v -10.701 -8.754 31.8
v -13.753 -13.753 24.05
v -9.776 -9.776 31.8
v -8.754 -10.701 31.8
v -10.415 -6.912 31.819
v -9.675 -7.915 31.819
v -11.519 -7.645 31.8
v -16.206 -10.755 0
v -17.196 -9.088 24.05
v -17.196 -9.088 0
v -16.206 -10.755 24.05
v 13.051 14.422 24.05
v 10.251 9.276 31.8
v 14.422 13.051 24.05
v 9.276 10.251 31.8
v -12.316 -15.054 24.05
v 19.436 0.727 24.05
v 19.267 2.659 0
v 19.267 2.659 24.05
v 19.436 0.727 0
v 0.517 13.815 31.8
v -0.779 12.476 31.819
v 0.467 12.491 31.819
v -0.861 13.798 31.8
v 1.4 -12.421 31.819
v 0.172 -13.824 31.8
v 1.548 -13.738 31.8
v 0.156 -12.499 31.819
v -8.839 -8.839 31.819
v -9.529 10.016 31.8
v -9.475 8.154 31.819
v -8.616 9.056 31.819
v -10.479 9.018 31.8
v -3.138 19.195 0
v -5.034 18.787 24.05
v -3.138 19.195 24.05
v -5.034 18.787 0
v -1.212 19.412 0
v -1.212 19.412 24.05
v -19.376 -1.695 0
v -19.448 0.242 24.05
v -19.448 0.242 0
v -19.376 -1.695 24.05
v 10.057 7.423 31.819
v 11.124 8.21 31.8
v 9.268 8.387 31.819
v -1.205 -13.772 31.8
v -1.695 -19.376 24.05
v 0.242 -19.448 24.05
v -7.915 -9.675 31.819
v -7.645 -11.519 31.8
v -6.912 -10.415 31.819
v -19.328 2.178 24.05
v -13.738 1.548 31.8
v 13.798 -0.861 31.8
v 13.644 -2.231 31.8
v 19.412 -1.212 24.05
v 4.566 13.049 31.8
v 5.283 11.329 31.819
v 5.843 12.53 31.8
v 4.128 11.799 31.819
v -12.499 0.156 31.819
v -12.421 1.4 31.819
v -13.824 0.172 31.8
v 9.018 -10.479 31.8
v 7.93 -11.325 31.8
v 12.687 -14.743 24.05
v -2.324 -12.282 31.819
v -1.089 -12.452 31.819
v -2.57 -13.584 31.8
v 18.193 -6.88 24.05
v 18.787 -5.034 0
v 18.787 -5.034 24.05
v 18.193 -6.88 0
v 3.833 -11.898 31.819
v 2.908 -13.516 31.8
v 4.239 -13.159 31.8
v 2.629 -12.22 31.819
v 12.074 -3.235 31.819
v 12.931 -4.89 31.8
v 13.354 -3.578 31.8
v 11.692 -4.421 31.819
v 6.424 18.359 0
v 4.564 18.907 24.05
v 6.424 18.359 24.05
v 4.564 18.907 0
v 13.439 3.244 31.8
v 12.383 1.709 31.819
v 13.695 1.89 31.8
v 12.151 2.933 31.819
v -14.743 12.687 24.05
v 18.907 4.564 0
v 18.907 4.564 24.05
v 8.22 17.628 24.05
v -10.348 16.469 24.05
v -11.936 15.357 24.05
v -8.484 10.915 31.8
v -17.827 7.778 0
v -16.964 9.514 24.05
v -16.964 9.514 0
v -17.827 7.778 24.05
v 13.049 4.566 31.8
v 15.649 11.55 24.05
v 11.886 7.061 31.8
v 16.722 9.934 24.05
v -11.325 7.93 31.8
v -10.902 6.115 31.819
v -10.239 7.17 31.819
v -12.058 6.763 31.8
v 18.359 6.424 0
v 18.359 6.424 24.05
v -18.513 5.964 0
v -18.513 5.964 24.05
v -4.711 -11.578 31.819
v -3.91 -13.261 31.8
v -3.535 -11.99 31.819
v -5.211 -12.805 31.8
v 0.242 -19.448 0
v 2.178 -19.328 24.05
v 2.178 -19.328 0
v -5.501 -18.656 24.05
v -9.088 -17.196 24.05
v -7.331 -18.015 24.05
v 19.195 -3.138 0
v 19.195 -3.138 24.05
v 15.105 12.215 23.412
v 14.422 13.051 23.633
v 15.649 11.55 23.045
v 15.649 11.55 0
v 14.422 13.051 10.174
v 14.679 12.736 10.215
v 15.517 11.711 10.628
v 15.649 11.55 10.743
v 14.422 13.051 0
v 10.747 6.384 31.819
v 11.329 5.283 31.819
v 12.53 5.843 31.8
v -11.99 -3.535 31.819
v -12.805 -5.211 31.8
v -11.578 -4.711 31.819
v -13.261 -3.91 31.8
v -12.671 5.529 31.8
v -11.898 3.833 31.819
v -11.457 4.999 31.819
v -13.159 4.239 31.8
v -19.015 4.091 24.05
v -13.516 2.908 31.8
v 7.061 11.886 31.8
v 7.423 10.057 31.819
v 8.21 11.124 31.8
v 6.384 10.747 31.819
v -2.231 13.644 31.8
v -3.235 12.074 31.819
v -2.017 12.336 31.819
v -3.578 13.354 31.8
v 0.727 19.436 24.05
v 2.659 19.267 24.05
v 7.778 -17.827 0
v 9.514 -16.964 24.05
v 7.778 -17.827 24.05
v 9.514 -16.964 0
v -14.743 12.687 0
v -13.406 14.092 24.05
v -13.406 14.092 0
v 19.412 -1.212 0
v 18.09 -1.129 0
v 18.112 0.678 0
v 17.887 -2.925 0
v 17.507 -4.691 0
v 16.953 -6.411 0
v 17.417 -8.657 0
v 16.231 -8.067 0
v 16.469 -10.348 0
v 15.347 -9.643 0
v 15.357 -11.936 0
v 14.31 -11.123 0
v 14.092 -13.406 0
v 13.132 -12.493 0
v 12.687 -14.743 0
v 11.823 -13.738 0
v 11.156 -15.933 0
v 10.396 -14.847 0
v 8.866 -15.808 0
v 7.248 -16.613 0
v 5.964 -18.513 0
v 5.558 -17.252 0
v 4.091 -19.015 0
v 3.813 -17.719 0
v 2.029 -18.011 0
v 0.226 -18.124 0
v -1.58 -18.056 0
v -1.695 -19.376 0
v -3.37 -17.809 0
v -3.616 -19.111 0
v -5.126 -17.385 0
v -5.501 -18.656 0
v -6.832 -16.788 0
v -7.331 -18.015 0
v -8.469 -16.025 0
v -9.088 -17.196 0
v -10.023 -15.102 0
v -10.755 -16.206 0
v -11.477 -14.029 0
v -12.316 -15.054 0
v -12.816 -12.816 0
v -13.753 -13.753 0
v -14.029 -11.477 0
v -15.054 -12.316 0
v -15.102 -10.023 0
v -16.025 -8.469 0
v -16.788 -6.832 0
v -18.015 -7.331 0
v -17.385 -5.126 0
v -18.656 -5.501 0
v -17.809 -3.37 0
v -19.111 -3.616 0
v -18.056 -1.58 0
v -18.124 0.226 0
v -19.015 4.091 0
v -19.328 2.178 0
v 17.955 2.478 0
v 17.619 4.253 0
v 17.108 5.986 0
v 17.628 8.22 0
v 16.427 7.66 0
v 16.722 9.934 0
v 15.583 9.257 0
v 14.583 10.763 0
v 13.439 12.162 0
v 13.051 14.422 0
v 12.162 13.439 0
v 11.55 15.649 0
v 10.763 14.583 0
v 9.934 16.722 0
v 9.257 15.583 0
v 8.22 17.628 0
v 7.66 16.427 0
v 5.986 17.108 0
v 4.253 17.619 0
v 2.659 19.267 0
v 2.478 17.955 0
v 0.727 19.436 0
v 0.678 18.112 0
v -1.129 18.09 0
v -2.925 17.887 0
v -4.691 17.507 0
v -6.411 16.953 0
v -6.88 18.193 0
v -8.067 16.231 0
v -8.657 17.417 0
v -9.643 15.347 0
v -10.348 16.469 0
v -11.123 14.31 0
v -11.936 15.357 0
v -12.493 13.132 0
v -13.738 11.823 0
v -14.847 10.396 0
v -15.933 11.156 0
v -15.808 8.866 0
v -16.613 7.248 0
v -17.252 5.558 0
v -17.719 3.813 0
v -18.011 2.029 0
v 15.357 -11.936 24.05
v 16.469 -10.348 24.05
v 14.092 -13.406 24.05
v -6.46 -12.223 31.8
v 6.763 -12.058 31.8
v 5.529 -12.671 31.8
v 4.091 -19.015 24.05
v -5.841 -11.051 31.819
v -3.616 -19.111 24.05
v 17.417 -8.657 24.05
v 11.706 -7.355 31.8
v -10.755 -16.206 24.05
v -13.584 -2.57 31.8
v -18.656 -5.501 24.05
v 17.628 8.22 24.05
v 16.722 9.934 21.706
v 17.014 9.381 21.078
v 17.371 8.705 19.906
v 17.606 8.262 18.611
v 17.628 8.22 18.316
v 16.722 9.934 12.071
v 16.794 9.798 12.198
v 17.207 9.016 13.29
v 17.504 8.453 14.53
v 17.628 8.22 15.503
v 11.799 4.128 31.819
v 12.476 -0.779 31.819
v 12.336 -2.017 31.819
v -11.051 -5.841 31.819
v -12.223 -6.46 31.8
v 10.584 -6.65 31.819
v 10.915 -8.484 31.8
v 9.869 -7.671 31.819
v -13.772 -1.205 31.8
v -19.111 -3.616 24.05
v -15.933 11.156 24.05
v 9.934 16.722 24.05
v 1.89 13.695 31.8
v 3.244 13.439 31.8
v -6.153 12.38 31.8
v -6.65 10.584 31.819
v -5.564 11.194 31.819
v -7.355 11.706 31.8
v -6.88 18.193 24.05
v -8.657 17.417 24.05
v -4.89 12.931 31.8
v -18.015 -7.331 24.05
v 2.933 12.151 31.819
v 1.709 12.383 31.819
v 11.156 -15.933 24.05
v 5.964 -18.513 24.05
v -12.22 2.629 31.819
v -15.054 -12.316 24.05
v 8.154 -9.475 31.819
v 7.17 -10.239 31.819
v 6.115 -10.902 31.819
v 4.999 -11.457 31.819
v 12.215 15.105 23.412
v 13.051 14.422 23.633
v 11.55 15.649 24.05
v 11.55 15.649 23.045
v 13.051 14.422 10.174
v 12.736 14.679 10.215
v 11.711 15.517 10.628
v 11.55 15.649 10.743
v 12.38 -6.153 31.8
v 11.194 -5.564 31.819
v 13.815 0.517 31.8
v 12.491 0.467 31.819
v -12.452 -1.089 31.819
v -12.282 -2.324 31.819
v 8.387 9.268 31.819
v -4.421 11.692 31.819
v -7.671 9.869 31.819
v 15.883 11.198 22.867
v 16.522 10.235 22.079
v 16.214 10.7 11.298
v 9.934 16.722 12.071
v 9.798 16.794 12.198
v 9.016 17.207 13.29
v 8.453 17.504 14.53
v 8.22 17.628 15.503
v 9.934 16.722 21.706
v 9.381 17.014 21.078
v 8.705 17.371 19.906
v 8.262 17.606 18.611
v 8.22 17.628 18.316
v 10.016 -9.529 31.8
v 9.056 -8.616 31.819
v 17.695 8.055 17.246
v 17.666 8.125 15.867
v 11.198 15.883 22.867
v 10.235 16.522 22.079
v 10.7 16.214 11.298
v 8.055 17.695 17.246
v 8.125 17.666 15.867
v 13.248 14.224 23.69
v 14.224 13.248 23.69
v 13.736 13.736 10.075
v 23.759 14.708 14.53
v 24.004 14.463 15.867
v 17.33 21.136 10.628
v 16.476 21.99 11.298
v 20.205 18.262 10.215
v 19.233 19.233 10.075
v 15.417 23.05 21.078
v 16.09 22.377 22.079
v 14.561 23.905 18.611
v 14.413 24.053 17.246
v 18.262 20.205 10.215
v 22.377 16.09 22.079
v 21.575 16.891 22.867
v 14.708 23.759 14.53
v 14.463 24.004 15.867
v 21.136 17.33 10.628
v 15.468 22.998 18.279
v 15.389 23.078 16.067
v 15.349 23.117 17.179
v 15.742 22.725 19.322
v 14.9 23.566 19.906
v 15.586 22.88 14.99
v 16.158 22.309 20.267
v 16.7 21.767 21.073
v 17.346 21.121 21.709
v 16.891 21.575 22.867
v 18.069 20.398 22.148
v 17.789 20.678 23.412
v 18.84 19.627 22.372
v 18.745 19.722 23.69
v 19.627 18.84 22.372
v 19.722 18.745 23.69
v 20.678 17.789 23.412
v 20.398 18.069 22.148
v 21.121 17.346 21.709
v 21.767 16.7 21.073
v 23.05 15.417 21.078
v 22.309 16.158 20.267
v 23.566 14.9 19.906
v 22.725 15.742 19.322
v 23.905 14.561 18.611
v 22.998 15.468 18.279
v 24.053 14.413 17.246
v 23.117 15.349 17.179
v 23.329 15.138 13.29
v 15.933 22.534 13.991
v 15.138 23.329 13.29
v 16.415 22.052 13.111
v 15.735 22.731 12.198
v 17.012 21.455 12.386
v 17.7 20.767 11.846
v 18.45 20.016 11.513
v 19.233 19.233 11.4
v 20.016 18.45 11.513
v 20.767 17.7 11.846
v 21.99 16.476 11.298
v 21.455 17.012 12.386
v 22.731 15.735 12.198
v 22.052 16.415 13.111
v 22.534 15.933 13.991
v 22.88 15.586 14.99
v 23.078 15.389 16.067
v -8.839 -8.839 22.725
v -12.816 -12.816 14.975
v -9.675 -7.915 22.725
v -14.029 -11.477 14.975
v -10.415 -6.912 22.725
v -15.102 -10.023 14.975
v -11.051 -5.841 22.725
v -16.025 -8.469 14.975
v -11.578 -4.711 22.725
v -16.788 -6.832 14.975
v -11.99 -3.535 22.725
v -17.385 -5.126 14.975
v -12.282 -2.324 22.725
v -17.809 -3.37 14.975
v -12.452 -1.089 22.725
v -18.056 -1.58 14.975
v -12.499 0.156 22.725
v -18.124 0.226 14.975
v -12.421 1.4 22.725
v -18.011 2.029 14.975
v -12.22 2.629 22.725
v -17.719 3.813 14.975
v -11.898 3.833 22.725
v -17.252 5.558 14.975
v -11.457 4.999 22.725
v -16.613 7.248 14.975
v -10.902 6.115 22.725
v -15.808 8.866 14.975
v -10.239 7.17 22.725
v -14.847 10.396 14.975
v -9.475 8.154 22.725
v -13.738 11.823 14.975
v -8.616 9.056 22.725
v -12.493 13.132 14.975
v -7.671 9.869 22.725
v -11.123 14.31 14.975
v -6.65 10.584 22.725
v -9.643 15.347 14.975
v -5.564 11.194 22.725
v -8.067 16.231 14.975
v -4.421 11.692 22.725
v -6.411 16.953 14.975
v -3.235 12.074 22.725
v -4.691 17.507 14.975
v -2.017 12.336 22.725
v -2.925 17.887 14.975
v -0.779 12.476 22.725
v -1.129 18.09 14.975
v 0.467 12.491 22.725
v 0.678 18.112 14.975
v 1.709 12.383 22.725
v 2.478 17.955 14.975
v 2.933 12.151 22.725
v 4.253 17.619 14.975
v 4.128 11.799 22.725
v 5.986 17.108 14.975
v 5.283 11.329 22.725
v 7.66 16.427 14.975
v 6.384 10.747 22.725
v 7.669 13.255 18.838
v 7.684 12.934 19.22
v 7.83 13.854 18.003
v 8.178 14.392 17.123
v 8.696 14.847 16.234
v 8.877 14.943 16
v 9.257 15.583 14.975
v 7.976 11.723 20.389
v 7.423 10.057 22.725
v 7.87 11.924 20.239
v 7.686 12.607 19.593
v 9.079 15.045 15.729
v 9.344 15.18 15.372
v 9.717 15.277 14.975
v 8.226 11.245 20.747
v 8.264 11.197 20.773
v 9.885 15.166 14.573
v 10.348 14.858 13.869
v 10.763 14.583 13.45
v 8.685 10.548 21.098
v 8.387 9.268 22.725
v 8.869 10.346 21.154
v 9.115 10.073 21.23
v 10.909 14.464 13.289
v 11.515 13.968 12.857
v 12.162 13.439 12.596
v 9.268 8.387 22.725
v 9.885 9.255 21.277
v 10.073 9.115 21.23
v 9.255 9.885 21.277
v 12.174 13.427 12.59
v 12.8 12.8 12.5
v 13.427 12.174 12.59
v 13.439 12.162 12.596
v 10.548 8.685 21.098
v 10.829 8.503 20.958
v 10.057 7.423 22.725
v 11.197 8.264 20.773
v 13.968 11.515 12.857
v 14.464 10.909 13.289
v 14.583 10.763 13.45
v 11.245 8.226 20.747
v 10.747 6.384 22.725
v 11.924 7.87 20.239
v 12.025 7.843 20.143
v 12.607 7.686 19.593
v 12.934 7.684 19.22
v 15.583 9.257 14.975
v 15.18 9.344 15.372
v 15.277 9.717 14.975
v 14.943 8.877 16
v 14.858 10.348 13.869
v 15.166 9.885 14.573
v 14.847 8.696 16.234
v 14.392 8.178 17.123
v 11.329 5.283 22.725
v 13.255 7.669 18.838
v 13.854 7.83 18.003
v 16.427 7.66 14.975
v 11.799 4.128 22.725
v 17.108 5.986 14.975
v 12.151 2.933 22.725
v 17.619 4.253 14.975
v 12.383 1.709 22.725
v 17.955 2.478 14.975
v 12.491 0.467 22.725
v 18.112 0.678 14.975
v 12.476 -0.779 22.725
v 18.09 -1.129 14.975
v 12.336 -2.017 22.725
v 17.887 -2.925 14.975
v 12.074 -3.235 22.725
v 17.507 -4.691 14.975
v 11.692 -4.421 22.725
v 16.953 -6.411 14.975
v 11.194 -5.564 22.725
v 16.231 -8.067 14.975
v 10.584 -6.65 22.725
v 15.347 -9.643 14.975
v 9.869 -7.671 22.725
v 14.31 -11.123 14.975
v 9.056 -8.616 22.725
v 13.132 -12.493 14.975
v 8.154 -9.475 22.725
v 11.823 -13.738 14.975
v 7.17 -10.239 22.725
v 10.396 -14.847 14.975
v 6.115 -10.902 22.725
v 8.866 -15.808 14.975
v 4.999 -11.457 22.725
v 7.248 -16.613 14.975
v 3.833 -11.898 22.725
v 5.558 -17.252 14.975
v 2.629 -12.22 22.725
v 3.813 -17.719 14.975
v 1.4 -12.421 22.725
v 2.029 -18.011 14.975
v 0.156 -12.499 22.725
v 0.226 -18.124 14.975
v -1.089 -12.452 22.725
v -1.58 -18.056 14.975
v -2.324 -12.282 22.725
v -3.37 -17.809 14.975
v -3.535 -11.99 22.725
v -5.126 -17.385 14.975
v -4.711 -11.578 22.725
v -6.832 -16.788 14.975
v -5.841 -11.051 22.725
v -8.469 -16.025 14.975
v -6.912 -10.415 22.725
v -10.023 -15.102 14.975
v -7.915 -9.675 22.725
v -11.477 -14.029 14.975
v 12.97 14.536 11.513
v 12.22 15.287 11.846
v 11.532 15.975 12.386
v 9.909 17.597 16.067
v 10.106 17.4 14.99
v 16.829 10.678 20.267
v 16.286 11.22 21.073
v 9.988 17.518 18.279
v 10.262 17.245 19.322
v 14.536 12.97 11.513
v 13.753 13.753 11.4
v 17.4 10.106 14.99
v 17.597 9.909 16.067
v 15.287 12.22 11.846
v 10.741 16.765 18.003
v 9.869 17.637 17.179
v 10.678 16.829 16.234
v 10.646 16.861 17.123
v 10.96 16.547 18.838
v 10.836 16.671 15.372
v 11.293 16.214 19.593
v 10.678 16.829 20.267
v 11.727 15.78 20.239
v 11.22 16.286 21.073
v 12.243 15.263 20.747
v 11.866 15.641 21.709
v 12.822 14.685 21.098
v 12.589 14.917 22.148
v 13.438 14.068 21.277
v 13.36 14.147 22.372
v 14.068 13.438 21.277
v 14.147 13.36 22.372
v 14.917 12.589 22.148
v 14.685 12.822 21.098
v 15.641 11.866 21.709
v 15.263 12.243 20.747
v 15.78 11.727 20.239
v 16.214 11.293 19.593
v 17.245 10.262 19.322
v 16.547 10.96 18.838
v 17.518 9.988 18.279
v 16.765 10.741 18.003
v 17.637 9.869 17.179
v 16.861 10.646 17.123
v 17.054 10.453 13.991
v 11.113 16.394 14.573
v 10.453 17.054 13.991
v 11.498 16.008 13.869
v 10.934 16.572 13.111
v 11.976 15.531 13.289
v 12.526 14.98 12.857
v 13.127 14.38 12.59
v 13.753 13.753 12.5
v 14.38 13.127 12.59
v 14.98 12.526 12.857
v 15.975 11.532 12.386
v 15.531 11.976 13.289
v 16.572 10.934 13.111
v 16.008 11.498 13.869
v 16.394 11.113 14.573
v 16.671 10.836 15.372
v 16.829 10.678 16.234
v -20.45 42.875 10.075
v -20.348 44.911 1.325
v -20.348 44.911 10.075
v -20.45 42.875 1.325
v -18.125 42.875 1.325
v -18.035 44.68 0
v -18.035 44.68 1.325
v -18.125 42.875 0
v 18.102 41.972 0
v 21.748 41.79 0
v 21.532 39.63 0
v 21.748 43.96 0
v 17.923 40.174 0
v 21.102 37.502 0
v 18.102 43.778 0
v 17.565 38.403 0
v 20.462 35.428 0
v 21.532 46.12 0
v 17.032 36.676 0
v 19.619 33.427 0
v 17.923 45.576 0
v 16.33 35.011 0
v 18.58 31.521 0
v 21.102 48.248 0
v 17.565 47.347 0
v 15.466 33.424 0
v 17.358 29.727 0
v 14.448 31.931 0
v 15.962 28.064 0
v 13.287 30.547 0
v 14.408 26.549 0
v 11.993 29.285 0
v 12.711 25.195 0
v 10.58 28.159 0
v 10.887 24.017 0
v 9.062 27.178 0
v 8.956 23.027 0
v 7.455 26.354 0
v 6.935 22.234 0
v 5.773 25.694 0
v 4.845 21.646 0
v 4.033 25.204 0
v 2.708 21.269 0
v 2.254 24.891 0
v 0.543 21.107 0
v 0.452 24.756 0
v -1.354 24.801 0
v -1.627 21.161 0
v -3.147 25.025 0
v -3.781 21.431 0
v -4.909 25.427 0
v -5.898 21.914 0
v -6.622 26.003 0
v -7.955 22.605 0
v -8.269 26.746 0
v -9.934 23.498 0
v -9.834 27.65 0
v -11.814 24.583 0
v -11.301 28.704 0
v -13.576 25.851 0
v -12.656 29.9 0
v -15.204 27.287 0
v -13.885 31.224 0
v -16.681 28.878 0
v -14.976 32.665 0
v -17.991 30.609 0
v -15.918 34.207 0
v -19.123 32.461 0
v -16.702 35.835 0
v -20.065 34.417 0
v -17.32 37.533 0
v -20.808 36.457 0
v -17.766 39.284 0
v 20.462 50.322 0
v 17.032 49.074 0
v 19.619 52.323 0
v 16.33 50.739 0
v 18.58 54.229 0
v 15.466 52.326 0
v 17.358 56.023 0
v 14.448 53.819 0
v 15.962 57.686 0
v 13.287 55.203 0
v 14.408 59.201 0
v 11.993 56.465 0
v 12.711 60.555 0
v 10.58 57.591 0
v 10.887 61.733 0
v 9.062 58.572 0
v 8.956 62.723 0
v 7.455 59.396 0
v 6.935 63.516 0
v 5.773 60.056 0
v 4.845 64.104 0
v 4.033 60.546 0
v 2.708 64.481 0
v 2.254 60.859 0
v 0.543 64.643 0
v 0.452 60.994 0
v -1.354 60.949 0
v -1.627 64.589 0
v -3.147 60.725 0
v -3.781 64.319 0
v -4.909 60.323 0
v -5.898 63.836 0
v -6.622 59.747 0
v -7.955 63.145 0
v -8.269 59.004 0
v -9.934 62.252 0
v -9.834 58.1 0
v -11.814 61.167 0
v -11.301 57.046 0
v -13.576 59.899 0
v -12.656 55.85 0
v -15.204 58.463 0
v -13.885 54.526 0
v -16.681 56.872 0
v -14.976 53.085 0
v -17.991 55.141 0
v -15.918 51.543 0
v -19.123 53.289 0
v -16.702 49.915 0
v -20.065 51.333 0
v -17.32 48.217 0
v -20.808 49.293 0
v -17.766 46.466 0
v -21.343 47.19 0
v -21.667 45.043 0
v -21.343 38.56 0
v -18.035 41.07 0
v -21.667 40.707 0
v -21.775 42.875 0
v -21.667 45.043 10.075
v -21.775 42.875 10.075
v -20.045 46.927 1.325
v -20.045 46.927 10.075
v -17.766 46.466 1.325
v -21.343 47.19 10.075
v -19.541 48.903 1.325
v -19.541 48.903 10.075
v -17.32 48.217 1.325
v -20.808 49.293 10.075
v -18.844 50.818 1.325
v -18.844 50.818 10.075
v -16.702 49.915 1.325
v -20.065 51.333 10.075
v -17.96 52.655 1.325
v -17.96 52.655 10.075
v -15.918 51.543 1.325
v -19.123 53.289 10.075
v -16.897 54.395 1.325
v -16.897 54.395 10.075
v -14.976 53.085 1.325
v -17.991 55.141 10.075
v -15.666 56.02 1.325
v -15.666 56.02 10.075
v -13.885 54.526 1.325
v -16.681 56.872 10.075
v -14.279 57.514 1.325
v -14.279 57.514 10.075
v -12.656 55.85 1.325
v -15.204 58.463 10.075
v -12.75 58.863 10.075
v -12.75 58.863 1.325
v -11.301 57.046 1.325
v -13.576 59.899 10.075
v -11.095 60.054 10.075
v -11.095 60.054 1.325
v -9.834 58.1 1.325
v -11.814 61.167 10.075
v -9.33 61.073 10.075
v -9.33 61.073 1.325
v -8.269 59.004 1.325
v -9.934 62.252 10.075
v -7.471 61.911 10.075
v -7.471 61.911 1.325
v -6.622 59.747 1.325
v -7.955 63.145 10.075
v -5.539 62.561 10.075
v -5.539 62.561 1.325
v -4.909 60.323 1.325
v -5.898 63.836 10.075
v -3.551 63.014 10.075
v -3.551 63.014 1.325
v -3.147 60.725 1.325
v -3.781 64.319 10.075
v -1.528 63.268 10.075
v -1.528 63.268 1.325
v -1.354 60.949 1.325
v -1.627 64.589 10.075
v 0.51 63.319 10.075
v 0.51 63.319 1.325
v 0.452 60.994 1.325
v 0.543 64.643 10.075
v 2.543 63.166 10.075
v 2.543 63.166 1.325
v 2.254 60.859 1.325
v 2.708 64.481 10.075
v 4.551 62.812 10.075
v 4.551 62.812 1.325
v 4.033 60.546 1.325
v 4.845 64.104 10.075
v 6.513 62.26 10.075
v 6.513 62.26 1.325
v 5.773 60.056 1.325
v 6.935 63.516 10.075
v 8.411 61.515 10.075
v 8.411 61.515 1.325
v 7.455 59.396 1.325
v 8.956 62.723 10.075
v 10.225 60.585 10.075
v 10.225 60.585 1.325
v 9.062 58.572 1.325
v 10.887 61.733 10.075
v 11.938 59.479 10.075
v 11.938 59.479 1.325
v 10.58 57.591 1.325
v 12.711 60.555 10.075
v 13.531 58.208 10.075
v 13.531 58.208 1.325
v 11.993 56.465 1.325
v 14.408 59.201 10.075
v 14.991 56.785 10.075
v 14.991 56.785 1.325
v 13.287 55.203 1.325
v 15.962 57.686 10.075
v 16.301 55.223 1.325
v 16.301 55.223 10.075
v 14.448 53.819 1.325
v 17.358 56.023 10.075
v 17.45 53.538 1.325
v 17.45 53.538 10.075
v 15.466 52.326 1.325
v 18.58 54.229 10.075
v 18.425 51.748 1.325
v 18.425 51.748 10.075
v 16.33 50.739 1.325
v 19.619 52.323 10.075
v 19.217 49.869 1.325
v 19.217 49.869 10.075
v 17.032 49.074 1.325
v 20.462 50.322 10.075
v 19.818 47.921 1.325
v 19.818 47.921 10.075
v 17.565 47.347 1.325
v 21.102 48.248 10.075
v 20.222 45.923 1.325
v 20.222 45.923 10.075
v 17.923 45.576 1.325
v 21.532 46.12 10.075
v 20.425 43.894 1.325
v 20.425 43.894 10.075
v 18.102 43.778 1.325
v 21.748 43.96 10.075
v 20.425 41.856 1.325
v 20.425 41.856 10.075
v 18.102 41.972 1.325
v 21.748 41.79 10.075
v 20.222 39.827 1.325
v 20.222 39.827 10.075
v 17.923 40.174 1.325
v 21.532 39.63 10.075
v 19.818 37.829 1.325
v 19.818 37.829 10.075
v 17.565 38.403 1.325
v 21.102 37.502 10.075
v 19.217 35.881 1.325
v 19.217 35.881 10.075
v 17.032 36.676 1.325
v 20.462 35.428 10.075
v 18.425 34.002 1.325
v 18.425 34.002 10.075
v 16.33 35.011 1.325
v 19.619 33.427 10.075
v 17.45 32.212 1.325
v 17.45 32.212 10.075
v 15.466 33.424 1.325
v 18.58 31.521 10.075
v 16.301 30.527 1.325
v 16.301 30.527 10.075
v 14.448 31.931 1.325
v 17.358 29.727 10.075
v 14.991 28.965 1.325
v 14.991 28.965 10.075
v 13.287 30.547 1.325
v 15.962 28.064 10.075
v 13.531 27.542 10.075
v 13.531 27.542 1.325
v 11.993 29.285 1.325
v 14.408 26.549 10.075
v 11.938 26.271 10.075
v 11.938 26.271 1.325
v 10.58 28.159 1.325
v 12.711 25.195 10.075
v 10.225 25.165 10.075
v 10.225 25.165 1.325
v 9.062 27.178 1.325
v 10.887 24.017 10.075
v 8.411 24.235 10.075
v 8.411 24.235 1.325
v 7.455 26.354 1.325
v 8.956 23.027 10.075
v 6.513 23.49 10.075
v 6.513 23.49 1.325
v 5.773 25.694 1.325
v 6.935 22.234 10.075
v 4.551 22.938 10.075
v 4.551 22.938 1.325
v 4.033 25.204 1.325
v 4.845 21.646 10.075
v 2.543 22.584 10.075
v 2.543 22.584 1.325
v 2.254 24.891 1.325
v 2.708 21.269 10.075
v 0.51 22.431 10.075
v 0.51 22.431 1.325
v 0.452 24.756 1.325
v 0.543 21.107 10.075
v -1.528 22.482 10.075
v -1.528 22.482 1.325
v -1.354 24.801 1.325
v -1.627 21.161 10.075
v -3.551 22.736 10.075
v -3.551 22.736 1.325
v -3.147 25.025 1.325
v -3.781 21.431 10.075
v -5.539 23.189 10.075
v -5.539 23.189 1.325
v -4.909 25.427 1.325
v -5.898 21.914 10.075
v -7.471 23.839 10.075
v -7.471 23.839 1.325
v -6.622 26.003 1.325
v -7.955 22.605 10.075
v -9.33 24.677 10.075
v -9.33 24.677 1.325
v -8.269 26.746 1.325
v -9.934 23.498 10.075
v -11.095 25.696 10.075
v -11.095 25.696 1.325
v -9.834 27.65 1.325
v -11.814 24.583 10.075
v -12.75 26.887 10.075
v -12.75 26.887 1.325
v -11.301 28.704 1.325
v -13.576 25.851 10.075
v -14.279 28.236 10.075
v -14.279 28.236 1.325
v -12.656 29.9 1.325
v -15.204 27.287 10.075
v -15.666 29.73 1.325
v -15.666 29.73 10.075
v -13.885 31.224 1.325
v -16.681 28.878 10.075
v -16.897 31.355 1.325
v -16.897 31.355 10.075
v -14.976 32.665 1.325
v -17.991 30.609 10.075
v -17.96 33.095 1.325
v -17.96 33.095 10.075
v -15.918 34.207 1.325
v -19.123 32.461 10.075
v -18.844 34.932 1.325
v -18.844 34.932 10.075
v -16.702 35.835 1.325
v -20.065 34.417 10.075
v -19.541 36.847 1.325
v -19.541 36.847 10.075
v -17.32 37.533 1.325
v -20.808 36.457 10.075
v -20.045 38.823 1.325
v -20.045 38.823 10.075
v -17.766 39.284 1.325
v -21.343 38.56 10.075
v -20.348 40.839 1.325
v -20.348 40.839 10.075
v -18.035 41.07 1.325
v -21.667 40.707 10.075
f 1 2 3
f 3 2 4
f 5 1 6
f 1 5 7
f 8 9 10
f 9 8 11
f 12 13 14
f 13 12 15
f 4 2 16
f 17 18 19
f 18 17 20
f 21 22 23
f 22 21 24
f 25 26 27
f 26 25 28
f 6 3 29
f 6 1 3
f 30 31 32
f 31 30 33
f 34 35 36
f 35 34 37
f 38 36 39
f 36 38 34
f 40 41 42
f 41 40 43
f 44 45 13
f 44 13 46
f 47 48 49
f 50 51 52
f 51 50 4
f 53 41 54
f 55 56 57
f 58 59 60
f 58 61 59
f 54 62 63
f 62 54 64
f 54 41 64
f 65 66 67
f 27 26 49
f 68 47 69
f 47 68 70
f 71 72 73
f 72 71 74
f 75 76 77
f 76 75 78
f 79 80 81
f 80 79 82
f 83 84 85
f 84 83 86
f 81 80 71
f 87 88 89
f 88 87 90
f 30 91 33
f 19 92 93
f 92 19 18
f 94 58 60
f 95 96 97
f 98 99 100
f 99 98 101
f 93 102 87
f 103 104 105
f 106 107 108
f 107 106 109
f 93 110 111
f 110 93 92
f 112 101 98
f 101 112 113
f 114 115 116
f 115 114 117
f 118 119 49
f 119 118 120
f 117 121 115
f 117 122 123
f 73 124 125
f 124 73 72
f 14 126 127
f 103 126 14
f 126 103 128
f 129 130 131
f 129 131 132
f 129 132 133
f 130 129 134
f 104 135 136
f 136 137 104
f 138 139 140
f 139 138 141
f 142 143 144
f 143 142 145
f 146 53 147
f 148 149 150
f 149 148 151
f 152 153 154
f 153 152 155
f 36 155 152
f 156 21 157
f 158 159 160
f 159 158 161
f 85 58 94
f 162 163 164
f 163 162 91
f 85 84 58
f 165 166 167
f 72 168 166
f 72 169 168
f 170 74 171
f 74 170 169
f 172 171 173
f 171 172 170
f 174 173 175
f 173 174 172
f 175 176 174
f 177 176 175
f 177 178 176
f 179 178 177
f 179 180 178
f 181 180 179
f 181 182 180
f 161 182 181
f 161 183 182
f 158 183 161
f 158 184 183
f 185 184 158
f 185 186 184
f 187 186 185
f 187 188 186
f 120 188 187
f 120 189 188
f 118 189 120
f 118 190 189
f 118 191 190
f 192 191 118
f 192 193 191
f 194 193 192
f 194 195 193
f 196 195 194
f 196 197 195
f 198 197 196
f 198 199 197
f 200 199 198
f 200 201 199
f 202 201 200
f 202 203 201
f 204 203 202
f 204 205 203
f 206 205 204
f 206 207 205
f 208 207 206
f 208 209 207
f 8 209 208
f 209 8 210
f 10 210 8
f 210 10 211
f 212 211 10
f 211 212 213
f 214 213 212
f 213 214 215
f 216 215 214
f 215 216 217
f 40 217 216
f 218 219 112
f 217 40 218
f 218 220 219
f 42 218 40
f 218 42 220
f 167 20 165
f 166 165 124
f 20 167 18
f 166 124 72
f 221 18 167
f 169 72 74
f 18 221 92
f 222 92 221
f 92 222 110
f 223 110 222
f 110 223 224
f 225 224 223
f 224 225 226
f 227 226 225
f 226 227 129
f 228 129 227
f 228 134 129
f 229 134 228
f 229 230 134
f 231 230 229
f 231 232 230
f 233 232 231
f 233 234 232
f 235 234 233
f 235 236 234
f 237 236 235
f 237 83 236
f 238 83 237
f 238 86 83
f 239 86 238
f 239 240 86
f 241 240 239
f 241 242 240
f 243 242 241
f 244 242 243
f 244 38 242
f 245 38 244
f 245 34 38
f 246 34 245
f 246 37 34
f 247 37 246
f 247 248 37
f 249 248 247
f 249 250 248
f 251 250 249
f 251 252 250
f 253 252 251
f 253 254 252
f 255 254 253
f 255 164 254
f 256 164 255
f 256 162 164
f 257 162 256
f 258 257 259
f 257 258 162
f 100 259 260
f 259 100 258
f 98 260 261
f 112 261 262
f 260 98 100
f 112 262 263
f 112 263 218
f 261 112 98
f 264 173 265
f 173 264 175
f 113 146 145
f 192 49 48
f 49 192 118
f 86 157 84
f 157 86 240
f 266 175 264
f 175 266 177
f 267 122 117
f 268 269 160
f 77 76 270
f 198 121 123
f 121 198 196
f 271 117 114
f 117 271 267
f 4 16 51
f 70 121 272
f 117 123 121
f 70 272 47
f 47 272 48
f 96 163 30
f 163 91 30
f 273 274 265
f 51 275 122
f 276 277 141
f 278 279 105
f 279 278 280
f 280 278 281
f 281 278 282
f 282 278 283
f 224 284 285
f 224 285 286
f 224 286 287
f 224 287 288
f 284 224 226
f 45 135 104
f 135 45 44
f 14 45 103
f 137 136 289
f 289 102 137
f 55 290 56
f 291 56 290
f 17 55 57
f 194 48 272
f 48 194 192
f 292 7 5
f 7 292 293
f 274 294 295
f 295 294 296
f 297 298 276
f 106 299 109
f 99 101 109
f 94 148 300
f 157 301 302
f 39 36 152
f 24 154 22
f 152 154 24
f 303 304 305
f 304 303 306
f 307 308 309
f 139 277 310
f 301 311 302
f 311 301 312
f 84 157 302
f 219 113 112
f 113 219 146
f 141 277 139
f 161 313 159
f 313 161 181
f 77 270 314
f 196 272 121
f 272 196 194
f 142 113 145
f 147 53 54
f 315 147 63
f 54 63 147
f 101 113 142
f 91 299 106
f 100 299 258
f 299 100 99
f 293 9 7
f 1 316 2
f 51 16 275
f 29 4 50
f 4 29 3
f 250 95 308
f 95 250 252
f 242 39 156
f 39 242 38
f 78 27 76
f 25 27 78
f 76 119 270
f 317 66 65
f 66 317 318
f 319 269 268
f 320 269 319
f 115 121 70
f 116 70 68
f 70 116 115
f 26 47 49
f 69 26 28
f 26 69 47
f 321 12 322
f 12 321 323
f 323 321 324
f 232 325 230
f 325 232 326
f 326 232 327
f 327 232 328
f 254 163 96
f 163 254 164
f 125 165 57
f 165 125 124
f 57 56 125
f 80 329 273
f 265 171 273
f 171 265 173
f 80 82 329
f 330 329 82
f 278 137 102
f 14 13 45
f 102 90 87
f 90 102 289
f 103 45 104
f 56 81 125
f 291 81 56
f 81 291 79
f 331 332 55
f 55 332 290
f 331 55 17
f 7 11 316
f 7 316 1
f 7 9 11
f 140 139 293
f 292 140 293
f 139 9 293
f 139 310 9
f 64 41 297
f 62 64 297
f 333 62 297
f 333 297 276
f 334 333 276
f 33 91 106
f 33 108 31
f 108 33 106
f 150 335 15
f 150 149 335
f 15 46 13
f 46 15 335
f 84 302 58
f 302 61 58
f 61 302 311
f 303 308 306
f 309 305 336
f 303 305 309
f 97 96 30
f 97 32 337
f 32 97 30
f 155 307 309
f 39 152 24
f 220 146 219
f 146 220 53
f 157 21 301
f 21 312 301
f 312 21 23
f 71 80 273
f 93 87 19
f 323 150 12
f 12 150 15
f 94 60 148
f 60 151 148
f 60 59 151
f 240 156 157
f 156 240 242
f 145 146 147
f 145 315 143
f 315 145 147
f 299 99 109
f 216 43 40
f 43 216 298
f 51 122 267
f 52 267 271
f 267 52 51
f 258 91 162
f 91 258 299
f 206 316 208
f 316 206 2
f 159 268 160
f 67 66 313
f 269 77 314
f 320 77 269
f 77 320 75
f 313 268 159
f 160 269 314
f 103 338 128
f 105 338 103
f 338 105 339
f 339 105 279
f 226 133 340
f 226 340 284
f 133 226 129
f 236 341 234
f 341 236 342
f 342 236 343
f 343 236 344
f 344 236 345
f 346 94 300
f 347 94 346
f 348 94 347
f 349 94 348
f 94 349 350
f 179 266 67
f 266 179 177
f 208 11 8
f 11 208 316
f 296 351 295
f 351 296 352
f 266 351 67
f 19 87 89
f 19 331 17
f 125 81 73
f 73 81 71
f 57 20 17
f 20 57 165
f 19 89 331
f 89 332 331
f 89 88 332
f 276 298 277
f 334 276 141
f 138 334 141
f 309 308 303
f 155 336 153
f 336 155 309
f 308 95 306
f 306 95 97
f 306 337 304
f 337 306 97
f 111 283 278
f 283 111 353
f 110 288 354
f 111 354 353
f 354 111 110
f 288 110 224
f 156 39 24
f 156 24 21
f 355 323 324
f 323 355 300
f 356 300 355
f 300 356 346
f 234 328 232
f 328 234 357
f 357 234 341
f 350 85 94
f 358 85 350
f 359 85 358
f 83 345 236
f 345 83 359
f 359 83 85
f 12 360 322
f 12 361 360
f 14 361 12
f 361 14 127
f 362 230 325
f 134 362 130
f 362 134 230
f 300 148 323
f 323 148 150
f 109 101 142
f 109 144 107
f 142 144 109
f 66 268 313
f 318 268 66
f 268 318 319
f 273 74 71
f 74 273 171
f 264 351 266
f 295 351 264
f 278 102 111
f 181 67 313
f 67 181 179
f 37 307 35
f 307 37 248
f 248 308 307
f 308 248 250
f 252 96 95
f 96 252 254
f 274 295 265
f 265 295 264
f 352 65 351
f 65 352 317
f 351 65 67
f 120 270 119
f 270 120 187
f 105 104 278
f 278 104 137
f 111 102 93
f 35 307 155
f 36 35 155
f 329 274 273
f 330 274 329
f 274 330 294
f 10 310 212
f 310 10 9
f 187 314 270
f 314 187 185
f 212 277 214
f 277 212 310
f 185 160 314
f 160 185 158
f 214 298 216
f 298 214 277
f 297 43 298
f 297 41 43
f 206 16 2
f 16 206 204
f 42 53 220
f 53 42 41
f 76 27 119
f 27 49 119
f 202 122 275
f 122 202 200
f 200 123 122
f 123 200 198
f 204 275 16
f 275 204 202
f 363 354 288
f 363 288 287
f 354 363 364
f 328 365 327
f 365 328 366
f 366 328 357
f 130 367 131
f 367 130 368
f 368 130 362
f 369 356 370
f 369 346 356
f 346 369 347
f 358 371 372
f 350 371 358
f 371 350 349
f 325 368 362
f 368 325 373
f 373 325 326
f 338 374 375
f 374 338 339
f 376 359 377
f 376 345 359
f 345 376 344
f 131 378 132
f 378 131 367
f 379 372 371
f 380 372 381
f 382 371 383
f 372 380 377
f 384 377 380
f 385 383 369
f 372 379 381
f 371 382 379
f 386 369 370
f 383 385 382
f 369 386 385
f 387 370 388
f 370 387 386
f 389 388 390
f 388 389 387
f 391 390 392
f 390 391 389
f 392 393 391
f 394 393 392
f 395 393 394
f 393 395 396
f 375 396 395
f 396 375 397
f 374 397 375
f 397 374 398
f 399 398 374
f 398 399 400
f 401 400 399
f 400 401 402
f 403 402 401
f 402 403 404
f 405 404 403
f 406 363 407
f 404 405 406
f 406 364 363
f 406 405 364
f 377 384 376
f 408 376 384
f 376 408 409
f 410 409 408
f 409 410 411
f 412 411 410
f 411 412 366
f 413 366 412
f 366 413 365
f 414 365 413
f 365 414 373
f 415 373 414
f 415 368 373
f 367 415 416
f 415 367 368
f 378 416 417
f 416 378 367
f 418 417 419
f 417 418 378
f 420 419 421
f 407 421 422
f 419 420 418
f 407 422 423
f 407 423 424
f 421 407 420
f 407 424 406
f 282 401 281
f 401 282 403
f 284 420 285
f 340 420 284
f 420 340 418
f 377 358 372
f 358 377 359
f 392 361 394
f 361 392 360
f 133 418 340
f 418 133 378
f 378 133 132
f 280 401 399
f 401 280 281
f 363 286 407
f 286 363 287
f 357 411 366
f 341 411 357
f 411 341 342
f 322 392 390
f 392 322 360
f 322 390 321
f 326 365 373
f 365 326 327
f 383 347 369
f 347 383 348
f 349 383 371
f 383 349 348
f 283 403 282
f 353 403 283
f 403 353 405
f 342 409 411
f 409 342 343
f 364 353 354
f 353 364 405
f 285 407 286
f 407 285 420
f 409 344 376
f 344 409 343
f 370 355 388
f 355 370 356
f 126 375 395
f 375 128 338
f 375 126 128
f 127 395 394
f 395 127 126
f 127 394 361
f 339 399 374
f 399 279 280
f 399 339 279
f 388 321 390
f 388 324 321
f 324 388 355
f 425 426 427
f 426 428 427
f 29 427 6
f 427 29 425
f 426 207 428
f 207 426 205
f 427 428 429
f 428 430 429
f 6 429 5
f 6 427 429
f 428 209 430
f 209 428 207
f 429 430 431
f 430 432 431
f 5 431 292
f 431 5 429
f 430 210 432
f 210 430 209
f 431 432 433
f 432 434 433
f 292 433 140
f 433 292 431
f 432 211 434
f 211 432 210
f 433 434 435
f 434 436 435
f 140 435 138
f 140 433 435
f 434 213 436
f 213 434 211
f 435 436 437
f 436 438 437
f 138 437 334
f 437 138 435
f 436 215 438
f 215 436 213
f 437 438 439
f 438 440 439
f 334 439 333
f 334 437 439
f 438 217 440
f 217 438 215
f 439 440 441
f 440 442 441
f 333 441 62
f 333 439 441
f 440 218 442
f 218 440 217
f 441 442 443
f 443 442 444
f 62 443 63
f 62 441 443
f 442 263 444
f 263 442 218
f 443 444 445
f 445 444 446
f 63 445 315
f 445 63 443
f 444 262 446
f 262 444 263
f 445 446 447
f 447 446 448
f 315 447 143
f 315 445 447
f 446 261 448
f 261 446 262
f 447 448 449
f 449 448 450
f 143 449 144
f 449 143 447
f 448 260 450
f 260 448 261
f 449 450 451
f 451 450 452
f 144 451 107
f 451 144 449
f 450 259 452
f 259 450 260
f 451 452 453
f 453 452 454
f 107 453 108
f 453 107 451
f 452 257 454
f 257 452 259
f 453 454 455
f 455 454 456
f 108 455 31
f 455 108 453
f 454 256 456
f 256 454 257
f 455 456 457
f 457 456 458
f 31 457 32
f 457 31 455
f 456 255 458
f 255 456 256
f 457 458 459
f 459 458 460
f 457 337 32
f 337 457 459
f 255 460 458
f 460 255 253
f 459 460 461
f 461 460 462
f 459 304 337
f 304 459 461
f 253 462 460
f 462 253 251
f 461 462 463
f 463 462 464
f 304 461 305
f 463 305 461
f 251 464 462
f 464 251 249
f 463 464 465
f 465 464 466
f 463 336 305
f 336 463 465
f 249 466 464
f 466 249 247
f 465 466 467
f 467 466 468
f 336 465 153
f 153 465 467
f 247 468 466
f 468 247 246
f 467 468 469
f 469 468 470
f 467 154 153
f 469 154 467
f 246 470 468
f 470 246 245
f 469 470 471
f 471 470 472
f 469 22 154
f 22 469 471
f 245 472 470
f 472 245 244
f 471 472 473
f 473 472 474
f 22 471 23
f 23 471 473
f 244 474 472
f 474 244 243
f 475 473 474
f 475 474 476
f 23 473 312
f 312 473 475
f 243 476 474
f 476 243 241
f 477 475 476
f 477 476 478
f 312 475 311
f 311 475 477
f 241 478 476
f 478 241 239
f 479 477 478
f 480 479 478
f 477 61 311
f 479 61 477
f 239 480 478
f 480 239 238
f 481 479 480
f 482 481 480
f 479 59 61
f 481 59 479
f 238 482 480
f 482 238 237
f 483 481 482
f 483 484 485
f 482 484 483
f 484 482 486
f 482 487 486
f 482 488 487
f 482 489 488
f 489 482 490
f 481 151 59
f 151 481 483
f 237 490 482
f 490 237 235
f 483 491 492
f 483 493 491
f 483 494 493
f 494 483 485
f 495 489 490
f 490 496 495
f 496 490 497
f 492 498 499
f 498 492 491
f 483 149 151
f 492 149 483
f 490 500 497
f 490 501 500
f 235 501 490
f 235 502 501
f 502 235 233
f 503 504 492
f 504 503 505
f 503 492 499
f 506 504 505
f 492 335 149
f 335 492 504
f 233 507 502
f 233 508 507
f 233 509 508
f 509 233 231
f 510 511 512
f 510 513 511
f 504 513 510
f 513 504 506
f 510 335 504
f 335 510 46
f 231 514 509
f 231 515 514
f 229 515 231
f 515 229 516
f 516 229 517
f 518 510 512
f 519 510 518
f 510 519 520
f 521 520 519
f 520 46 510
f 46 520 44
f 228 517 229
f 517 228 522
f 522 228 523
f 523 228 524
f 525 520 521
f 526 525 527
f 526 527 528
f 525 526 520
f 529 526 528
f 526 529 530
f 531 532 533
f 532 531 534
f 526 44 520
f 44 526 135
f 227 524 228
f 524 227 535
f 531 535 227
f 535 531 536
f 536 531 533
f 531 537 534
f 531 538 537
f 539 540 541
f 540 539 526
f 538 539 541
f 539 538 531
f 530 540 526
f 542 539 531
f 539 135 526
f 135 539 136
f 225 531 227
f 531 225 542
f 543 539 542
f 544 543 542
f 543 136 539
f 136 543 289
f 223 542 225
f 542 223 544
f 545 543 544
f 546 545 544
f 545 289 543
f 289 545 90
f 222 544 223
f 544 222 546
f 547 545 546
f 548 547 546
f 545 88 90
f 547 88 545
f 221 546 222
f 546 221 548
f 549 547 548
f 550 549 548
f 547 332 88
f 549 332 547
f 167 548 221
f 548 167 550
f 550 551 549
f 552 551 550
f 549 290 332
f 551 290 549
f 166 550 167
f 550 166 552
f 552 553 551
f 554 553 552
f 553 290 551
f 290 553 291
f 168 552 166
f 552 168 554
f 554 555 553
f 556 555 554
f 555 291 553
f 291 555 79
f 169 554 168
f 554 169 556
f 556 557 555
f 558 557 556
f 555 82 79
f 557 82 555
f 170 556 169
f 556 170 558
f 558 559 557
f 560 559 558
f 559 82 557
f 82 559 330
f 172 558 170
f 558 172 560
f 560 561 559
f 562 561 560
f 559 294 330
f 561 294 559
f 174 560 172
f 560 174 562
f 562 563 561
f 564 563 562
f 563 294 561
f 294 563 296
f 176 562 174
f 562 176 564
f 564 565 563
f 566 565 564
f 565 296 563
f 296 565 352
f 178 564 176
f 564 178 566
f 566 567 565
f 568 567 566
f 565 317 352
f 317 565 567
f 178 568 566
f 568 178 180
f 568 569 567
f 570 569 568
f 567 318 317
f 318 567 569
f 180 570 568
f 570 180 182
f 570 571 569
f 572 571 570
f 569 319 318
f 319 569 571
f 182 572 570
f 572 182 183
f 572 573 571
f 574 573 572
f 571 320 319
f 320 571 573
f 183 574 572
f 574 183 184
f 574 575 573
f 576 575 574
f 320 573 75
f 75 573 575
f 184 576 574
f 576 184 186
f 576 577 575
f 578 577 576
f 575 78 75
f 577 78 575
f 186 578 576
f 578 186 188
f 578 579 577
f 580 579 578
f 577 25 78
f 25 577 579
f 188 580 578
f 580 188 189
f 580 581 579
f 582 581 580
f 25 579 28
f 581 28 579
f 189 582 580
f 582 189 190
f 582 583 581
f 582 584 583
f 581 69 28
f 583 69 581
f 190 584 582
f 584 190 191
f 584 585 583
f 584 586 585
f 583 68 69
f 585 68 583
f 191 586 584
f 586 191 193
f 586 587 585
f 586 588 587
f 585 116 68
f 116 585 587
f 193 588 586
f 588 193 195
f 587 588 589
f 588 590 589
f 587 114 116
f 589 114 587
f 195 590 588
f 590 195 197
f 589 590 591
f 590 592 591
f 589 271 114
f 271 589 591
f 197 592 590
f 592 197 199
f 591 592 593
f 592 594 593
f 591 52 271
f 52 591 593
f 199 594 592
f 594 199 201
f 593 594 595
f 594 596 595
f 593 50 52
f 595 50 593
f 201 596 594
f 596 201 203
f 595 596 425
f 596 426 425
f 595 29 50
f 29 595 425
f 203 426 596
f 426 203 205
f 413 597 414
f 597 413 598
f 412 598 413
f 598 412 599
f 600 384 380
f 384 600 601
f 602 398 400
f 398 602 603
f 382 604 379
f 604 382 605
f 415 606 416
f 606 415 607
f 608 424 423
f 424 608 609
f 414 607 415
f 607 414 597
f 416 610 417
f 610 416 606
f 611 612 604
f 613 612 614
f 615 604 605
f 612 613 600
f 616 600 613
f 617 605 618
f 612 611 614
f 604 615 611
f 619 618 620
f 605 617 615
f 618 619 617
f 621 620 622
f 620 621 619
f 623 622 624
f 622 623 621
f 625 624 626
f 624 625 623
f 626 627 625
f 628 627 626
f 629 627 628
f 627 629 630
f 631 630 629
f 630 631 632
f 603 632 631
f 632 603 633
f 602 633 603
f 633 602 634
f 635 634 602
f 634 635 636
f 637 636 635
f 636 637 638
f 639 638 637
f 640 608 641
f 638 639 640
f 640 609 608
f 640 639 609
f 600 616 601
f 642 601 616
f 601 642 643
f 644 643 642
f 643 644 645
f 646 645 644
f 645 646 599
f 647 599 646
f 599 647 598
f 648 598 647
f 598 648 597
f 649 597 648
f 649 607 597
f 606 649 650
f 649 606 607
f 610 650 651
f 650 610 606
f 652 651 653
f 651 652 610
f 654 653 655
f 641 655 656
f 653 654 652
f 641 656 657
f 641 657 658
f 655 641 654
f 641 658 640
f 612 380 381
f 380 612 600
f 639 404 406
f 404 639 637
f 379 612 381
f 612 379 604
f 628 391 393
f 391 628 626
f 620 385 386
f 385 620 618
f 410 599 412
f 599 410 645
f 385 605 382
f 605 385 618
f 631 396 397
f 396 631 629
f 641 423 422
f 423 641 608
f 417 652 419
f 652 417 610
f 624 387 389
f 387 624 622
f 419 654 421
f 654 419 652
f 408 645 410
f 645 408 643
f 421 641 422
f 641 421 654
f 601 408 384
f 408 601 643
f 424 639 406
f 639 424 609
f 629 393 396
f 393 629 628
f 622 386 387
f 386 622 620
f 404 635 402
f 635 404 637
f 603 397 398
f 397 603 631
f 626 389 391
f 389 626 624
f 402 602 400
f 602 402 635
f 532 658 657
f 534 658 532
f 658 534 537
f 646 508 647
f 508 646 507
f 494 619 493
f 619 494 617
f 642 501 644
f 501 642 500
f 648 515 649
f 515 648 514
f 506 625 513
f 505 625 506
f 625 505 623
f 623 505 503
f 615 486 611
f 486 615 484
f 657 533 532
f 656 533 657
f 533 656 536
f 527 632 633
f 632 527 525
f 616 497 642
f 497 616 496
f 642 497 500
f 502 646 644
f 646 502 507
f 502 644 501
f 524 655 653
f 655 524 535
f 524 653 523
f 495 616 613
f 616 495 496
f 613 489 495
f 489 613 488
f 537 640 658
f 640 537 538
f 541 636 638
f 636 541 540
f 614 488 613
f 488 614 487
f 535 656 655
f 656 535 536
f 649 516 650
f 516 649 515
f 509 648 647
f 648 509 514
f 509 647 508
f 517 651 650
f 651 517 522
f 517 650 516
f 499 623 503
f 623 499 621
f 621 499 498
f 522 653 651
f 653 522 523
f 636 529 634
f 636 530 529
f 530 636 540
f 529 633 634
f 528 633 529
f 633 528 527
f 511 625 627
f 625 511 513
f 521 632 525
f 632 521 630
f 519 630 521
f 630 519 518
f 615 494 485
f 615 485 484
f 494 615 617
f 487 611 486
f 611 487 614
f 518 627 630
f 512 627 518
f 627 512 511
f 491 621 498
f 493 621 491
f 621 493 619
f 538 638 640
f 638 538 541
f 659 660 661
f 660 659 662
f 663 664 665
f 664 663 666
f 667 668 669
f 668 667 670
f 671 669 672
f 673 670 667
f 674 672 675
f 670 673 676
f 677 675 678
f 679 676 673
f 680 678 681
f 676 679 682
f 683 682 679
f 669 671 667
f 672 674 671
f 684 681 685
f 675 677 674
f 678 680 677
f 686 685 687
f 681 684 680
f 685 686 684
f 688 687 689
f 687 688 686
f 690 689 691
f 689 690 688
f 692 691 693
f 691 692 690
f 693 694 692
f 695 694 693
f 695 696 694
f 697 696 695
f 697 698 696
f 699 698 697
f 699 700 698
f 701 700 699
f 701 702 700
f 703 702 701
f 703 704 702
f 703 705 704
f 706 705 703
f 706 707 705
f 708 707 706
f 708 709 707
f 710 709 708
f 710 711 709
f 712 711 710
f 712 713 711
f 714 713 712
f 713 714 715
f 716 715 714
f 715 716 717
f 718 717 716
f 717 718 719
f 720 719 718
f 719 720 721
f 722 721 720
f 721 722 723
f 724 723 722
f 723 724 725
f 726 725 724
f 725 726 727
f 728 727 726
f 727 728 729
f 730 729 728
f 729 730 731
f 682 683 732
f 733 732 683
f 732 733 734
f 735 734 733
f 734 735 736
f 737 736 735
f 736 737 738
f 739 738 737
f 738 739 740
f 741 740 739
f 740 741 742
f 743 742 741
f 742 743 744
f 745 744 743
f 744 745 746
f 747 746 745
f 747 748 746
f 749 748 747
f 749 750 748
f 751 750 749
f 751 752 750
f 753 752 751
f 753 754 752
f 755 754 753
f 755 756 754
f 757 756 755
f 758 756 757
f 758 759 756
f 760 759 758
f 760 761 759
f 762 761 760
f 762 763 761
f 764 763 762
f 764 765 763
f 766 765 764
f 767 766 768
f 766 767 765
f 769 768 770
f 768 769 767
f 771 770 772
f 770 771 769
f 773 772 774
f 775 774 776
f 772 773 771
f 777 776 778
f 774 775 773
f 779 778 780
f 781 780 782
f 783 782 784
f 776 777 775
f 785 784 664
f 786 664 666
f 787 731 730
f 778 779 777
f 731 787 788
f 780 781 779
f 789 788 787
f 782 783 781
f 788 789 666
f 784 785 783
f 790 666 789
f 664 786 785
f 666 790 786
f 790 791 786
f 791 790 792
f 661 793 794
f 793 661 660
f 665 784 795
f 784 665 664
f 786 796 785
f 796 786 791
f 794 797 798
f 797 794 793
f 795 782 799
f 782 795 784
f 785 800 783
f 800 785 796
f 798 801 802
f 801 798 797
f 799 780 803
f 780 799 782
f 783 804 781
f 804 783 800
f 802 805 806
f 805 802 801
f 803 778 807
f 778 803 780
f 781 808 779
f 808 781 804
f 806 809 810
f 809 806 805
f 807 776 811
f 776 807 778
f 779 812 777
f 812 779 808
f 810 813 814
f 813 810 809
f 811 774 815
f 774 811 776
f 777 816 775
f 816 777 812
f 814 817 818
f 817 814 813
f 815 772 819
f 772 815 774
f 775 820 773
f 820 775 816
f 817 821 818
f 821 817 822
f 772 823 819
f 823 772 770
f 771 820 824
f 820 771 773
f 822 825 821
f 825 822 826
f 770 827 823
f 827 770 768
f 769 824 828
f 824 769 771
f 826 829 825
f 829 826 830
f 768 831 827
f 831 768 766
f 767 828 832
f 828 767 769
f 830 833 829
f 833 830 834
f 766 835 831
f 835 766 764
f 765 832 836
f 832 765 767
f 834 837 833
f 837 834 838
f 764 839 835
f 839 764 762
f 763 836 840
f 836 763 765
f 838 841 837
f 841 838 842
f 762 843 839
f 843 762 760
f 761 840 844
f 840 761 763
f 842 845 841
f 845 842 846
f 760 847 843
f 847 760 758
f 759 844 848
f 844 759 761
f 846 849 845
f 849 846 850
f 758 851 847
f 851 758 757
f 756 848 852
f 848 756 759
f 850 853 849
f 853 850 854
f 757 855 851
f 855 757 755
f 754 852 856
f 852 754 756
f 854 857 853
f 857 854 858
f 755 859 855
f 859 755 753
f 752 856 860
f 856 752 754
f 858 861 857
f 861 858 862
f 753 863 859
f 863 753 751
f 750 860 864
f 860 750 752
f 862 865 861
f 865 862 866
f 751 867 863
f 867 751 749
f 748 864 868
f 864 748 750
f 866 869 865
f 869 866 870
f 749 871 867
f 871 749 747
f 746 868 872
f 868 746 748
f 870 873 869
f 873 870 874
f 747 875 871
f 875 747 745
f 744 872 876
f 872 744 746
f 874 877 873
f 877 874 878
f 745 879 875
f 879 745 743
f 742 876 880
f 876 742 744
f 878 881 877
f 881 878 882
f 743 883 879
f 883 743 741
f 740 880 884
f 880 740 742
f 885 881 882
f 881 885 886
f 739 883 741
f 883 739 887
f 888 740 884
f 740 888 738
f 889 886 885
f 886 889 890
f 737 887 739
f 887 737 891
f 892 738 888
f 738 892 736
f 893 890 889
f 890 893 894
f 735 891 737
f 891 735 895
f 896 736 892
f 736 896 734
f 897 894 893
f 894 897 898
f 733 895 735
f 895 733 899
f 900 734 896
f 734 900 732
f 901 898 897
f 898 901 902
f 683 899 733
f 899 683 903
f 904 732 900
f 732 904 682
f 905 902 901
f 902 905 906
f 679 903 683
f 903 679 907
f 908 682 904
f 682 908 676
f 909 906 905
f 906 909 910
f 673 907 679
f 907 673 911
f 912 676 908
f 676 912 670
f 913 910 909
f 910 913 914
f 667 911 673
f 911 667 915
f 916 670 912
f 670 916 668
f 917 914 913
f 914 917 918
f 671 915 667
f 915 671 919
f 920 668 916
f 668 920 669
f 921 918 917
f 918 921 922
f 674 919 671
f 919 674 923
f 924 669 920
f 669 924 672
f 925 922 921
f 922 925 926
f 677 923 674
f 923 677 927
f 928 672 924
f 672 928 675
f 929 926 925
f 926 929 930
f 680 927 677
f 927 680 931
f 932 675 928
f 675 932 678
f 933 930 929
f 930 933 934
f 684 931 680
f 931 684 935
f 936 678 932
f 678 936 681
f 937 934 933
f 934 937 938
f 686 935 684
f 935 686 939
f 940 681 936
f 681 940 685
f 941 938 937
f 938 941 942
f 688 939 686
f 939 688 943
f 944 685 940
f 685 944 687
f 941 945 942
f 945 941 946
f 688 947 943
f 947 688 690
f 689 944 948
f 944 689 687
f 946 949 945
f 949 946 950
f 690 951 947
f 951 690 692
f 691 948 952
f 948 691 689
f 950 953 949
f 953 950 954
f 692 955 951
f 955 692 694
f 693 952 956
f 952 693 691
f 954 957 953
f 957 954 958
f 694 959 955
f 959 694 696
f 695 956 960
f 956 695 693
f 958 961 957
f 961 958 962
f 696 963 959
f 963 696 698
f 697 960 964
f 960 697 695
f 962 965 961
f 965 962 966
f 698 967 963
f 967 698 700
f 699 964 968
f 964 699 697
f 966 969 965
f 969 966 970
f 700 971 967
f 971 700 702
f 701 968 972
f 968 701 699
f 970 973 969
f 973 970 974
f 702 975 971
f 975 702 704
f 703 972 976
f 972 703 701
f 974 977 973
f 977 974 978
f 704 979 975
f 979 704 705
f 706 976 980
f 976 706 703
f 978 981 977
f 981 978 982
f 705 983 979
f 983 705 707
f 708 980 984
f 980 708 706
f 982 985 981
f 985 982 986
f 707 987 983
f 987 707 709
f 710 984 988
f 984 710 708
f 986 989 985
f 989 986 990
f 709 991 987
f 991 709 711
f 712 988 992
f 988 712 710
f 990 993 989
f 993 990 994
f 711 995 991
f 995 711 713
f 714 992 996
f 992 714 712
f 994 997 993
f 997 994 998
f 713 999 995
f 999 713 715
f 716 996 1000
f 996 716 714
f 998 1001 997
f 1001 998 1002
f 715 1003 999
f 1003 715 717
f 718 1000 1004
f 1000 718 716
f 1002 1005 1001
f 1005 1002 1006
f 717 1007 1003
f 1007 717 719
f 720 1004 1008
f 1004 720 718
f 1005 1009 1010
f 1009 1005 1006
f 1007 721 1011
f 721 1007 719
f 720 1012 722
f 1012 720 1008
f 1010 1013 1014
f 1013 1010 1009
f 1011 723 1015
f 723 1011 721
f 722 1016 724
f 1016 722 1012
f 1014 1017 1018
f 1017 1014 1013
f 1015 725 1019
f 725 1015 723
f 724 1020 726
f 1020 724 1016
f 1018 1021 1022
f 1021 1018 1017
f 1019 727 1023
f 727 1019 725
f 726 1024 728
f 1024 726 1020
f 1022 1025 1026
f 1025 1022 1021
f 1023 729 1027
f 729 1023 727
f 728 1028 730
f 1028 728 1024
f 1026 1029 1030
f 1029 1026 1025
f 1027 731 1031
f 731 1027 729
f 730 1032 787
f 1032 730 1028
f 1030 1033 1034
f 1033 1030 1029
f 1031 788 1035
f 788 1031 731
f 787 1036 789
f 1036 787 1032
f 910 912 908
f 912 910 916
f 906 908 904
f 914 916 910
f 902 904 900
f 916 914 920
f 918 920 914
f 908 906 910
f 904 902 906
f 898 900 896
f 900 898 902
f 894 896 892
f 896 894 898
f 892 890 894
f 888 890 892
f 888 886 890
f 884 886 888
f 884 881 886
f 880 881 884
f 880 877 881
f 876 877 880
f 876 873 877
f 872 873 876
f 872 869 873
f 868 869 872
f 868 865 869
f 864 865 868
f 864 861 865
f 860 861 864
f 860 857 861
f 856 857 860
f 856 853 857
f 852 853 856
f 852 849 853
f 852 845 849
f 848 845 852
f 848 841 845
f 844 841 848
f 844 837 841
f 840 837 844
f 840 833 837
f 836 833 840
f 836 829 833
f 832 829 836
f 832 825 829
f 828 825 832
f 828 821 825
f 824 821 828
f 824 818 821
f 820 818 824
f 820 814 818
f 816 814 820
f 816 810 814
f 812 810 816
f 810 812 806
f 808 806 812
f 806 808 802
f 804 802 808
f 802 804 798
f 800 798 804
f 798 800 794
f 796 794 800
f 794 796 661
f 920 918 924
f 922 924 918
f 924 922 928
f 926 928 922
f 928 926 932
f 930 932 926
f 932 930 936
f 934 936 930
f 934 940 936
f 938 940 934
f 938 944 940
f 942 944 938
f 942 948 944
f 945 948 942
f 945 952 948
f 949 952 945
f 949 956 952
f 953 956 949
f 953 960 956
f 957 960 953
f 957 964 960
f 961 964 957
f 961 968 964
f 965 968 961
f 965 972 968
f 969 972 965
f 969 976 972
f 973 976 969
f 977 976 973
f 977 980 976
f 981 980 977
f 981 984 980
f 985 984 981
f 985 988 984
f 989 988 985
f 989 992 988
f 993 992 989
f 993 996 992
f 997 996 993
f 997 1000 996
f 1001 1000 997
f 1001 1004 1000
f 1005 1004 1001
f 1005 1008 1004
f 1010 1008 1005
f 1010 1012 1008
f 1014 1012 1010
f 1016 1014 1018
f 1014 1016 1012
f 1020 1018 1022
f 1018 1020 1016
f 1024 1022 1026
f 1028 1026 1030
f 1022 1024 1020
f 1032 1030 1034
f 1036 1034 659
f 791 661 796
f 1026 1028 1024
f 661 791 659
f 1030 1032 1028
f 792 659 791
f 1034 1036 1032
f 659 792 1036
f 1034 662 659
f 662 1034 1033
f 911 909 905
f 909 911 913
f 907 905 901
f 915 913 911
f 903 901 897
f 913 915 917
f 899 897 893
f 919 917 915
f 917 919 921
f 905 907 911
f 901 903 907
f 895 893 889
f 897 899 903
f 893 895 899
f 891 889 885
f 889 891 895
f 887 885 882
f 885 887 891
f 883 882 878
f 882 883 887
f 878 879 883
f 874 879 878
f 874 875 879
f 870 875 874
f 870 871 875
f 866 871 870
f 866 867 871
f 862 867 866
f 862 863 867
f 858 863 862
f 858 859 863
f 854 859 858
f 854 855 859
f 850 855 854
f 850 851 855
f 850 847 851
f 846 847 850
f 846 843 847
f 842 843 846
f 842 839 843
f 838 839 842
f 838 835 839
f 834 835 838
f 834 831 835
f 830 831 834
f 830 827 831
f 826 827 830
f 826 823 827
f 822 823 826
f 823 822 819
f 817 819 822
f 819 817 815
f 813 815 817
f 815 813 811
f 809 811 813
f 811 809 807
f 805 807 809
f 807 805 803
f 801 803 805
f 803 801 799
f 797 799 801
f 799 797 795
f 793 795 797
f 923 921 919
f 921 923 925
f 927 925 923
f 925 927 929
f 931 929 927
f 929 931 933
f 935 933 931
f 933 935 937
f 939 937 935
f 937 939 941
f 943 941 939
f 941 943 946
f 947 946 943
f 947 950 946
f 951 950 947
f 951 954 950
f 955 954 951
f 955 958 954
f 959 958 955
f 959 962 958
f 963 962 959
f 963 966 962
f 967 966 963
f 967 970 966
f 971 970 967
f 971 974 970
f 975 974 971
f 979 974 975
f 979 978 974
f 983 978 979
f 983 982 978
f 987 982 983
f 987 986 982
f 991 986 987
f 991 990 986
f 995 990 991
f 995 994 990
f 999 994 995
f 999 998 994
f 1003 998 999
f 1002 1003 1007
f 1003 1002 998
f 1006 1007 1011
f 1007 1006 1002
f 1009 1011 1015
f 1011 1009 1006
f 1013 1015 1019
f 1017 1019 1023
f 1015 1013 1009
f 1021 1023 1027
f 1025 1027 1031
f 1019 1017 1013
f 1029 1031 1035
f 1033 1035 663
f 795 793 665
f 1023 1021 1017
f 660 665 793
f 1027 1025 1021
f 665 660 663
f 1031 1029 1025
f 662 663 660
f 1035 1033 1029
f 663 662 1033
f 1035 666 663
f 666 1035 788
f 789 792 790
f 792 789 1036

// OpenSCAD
/* [main] */
// resonator pipe, outer diameter
pipe_diameter = 25;
// air suppy tube, doesn't matter if you use your mouth
tube_diameter = 11;    
rubber_thickness = 1;

 /* [Hidden] */

// probably don't change those
min_wall = 1.2 + pipe_diameter * 0.005;

// proportions
inner_diameter = pipe_diameter * 1.25 + 5;
stuck_width = pipe_diameter*0.15 + 4;
fn = round(pipe_diameter * 2.5);

// inner part
rotate([0, 0, 45])
difference(){
    union(){
        rotate_extrude($fn=fn) polygon
            (points=[
                [0, 0],
                [inner_diameter/2 + min_wall,0],
                [inner_diameter/2 + min_wall, stuck_width + min_wall*4 + tube_diameter],
                [pipe_diameter/2 + min_wall, stuck_width*2 + min_wall*4 + tube_diameter],
                [0, stuck_width + min_wall*10 + tube_diameter]]);
        translate ([0, 0, stuck_width + min_wall*2 + tube_diameter/2+ rubber_thickness])
            rotate ([0, 90, 0])
                cylinder 
                    (inner_diameter/2 + min_wall + stuck_width, 
                    tube_diameter/2 + min_wall, tube_diameter/2 + min_wall, $fn=fn/2);
    };
     union(){
        rotate_extrude($fn=fn) polygon
            (points=[
                [0, -1],
                [inner_diameter/2, -1],
                [inner_diameter/2, min_wall*3 + tube_diameter],
                [pipe_diameter/2, stuck_width + min_wall*3 + tube_diameter],
                [pipe_diameter/2, stuck_width*2 + min_wall*4 + tube_diameter +1],
                [0, stuck_width + min_wall*10 + tube_diameter +1]]);
        translate ([inner_diameter/2 + min_wall, 0, stuck_width + min_wall*2 + tube_diameter/2 + rubber_thickness])
            rotate ([0, 90, 0])
                cylinder 
                    (inner_diameter/2 + min_wall + stuck_width, 
                    tube_diameter/2, tube_diameter/2, $fn=fn/2);
         translate ([0, 0, stuck_width + min_wall*2 + tube_diameter/2 + rubber_thickness])
            rotate ([0, 90, 0])
                cylinder 
                    (inner_diameter/2 + min_wall + stuck_width, 
                    tube_diameter*0.4, tube_diameter*0.4, $fn=fn/2);
    };   
}

// outer part
translate([0, inner_diameter + 5*min_wall, min_wall + rubber_thickness])
rotate_extrude($fn=fn) polygon
    (points=[
        [inner_diameter/2, -rubber_thickness - min_wall],
        [inner_diameter/2 + min_wall*2 + rubber_thickness, -rubber_thickness - min_wall],
        [inner_diameter/2 + min_wall*2 + rubber_thickness, stuck_width],
        [inner_diameter/2 + min_wall + rubber_thickness, stuck_width],
        [inner_diameter/2 + min_wall + rubber_thickness, -rubber_thickness],
        [inner_diameter/2, -rubber_thickness]]);  
